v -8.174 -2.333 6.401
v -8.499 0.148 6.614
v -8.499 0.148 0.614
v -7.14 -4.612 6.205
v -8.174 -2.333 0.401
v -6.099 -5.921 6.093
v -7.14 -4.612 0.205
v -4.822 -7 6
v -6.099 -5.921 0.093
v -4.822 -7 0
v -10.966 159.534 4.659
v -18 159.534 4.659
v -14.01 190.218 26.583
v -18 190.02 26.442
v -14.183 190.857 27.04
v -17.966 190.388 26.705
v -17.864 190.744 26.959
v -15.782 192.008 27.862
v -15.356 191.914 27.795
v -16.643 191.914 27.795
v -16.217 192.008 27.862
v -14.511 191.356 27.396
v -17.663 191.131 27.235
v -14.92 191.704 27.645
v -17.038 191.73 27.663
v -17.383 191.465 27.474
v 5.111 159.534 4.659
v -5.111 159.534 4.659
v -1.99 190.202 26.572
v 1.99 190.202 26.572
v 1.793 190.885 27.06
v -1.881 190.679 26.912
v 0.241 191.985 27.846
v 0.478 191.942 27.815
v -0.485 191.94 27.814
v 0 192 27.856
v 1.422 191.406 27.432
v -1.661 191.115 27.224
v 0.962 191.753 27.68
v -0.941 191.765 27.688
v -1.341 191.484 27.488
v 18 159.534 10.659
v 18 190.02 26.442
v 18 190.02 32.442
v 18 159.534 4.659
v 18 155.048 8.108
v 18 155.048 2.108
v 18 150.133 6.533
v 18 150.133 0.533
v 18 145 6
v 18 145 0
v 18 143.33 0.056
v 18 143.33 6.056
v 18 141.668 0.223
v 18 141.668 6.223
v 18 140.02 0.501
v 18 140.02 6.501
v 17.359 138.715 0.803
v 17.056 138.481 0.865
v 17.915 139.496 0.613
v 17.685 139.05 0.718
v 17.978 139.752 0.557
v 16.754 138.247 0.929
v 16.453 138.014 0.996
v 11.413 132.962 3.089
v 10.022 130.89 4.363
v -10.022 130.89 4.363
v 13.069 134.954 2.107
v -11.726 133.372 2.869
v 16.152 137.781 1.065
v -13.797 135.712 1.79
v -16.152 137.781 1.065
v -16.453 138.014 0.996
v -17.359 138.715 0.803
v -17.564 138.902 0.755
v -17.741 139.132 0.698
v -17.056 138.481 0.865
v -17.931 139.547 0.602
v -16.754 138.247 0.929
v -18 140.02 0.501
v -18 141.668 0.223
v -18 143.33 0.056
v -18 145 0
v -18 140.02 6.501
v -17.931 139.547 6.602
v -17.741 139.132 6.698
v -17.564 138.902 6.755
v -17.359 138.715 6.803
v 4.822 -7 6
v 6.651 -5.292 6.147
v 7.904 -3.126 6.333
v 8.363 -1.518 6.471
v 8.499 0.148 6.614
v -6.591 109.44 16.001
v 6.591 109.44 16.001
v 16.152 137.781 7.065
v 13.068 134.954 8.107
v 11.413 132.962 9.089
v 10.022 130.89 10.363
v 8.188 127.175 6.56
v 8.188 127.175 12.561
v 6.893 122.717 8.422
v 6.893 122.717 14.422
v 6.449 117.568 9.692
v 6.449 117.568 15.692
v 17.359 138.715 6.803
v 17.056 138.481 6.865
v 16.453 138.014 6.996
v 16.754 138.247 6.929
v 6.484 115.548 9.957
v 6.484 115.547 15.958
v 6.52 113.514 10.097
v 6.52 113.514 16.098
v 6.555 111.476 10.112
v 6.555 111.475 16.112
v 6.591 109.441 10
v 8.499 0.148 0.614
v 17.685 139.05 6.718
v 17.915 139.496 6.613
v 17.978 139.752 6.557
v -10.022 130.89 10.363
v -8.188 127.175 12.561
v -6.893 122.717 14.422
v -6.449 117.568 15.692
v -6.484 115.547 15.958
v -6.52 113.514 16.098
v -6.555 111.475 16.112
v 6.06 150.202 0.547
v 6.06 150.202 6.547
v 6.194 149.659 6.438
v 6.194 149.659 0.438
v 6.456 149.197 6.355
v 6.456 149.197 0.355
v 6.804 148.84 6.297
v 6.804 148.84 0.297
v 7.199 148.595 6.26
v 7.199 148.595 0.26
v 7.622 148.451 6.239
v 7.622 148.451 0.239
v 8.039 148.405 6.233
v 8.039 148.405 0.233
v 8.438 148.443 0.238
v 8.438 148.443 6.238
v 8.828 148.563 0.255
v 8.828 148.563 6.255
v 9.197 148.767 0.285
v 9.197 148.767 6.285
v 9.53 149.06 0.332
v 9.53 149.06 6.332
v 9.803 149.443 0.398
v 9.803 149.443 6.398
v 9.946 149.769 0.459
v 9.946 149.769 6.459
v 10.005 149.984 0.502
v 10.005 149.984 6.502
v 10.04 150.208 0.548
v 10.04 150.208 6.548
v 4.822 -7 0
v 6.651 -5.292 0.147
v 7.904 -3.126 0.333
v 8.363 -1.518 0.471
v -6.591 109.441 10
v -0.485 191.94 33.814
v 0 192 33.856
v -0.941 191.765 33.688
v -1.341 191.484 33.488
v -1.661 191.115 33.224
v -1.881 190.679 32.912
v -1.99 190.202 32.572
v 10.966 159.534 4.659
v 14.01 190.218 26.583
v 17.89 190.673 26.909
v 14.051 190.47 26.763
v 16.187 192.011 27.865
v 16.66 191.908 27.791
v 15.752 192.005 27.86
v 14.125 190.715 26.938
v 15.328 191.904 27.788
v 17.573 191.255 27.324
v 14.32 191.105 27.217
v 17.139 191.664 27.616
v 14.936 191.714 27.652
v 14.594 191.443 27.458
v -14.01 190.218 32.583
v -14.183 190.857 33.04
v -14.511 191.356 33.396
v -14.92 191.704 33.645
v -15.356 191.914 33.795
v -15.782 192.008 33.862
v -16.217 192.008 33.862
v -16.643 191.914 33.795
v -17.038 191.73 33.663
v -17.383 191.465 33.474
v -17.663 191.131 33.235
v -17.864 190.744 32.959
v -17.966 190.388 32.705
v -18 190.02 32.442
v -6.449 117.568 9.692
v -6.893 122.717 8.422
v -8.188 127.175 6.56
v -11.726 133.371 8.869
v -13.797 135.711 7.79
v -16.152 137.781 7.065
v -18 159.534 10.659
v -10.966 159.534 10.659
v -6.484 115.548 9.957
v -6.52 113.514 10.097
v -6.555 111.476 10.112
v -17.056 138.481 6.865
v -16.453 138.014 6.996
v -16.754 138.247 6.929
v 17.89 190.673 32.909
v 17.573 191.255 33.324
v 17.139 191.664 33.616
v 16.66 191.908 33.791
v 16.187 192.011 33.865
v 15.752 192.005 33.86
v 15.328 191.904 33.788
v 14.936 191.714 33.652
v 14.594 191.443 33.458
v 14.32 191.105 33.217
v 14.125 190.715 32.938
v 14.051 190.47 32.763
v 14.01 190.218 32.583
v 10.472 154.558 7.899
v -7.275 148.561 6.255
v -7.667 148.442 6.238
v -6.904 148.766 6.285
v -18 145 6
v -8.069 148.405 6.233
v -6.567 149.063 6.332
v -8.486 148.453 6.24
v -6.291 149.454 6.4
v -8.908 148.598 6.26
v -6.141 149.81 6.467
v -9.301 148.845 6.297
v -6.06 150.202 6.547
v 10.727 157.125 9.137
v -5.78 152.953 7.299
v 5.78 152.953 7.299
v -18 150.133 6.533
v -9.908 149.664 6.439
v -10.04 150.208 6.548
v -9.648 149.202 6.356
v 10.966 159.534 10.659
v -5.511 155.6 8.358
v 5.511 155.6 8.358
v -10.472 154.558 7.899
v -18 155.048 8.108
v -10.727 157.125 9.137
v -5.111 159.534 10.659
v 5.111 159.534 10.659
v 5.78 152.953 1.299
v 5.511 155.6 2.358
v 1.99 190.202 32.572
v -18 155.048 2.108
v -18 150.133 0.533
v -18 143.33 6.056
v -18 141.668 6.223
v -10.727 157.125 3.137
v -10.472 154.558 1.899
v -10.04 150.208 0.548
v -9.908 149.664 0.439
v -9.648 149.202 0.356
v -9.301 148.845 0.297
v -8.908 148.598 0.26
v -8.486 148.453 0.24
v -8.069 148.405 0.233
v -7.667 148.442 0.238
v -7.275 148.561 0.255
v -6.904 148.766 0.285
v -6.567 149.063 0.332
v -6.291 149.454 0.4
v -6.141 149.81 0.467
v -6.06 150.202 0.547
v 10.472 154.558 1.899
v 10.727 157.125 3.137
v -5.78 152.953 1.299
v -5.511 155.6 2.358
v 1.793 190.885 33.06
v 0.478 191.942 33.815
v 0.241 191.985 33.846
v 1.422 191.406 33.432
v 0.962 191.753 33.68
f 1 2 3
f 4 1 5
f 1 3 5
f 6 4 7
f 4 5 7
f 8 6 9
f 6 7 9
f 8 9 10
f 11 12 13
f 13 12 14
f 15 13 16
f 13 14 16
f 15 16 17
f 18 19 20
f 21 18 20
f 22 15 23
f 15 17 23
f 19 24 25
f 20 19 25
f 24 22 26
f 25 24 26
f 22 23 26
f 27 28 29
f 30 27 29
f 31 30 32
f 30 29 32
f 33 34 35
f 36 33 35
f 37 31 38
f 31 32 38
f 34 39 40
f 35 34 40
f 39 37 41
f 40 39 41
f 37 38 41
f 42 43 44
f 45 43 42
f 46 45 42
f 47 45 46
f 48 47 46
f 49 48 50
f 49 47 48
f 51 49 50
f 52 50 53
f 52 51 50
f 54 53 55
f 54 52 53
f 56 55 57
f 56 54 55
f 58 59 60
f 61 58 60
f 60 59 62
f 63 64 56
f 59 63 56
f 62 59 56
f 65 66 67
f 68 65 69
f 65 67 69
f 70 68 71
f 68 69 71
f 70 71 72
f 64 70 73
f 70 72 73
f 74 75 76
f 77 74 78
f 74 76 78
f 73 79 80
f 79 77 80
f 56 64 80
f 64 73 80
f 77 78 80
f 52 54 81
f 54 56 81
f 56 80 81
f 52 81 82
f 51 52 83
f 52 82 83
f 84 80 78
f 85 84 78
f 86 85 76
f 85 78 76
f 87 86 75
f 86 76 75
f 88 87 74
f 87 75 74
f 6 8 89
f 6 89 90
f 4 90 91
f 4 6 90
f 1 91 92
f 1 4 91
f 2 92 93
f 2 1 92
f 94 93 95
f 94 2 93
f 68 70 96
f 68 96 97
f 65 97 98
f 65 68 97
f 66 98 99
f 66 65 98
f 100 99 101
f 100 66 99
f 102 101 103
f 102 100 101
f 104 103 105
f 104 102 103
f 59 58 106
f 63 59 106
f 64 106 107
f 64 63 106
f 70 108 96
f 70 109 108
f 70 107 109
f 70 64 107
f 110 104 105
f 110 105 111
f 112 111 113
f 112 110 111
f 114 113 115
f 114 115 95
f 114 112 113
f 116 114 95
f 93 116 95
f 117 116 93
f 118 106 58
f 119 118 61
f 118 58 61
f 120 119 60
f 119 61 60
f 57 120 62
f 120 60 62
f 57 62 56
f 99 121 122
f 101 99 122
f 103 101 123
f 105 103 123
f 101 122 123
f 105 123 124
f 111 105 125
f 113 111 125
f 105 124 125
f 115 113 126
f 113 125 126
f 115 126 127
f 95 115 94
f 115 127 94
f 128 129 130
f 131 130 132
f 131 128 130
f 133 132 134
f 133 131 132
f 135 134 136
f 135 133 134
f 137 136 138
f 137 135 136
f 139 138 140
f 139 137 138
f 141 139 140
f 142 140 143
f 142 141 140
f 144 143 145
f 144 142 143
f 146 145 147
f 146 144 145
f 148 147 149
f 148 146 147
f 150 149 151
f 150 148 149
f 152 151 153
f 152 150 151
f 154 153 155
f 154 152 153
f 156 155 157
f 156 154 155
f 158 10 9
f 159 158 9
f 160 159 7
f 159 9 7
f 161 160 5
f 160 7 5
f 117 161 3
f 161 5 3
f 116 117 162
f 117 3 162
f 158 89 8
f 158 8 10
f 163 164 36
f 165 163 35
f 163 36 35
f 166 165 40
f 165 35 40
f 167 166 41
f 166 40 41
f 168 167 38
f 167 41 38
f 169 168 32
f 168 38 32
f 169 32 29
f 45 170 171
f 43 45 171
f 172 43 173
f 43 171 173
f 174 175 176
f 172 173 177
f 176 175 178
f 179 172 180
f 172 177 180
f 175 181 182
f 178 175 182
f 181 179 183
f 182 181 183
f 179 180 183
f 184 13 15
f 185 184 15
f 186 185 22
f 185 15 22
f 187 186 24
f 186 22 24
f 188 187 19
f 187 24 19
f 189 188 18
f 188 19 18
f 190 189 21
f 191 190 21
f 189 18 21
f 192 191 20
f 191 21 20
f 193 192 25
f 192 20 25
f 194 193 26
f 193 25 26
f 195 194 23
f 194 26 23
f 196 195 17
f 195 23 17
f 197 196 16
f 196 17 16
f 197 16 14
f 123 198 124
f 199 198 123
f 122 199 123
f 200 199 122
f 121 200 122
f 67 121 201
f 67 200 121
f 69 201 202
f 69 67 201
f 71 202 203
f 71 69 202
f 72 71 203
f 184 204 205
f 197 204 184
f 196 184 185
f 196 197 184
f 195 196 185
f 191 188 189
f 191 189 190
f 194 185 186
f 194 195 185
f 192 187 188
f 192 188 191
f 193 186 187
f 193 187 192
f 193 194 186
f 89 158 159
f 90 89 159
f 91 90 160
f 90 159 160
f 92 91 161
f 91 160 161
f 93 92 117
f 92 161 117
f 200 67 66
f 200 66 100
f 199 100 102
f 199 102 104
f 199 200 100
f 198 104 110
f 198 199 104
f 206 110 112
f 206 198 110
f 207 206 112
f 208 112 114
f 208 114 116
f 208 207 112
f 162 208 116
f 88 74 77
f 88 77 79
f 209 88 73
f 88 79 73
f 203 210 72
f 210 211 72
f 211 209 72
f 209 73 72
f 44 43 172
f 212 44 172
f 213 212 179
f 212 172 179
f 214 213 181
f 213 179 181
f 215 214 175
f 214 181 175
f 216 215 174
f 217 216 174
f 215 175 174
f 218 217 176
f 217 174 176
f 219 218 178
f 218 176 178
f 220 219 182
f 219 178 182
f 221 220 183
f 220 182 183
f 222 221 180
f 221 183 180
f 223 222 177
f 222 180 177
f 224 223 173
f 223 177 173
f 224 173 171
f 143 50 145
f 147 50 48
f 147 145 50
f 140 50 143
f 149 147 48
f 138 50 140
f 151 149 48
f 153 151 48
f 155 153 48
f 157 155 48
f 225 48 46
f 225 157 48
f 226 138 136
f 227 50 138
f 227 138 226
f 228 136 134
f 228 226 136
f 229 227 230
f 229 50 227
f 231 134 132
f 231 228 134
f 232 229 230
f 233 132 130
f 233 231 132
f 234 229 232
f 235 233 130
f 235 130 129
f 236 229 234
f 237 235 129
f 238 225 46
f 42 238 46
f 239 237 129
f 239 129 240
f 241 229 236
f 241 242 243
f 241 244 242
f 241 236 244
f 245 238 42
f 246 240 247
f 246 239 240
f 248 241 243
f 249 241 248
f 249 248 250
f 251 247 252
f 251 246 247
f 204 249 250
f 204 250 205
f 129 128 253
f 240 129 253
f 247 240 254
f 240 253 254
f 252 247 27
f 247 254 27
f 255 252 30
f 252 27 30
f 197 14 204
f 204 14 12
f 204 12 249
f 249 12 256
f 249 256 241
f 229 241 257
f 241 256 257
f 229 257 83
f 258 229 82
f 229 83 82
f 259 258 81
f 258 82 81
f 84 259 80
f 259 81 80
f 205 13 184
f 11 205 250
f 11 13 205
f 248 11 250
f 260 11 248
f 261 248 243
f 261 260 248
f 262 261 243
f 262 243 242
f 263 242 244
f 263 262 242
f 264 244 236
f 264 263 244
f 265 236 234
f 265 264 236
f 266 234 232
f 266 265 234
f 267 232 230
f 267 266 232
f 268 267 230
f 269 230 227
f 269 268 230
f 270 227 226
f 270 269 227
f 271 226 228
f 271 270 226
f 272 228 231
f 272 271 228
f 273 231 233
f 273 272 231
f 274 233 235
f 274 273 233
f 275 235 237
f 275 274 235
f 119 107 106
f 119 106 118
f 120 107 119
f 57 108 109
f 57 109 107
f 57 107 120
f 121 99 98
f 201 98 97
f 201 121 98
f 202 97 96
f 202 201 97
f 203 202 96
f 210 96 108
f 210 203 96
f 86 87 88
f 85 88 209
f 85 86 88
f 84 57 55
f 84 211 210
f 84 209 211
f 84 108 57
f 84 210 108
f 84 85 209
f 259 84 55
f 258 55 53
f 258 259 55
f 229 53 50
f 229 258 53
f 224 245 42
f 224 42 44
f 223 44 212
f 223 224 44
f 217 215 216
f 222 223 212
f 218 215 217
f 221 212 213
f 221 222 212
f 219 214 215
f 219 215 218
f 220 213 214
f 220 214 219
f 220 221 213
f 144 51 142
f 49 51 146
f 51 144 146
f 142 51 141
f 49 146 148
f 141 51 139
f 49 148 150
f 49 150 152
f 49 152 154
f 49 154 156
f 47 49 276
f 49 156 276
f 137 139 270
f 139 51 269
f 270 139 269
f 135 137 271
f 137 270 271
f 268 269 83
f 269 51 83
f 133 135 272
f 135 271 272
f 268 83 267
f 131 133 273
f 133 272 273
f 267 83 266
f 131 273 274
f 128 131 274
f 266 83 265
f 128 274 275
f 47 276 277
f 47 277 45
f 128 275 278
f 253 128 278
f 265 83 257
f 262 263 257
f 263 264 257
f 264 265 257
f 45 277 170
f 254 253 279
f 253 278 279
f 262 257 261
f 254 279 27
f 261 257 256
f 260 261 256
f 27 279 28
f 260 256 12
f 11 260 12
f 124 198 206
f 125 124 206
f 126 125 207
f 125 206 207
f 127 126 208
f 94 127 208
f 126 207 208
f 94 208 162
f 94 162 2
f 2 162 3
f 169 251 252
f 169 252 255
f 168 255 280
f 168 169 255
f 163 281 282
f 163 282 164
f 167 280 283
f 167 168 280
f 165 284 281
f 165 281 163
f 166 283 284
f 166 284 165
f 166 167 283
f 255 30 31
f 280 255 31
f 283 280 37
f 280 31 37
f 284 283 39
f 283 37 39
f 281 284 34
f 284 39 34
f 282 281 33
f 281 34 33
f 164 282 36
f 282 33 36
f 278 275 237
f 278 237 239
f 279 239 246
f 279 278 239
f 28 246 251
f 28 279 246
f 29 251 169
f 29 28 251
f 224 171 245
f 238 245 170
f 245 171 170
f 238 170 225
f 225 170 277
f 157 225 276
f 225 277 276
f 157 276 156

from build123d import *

# Parameters (mm, degrees)
PAD001_DEPTH = 50
PAD_DEPTH    = 50


with BuildPart() as forkyz:
    # Sketch → Pad001 (new body)
    with BuildSketch(Plane.YZ):
        with BuildLine():
            Line((-7, 0), (109.440979, 10))
            ThreePointArc((130.889931, 4.362511), (120.653215, 9.037037), (109.440979, 10))
            ThreePointArc((130.889931, 4.362511), (137.615463, 1.115515), (145, 0))
            ThreePointArc((145, 0), (152.631281, 1.193204), (159.534108, 4.658916))
            Line((159.534108, 4.658916), (195, 30))
            Line((195, 30), (195, 36))
            Line((159.534108, 10.658916), (195, 36))
            ThreePointArc((145, 6), (152.631281, 7.193204), (159.534108, 10.658916))
            ThreePointArc((130.889584, 10.362749), (137.615262, 7.115577), (145, 6))
            ThreePointArc((130.889584, 10.362749), (120.652594, 15.03754), (109.44, 16.000536))
            Line((-7, 6), (109.44, 16.000536))
            Line((-7, 6), (-7, 0))
        make_face()
    extrude(amount=PAD001_DEPTH)


with BuildPart() as forkyz_1:
    # Body001 placement: moved
    add(forkyz.part.moved(Location((-25, 0, 0))))


with BuildPart() as common:
    # Sketch003 → Pad (new body)
    with BuildSketch(Plane.XY):
        with BuildLine():
            Line((18, 190.020199), (18, 140.020199))
            ThreePointArc((17.359364, 138.714947), (17.831207, 139.293202), (18, 140.020199))
            Line((17.359364, 138.714947), (16.151931, 137.781227))
            ThreePointArc((16.151931, 137.781227), (8.907519, 128.823515), (6.449131, 117.568362))
            Line((6.449131, 117.568362), (8.498705, 0.148345))
            ThreePointArc((0, -8.5), (6.062629, -5.957729), (8.498705, 0.148345))
            ThreePointArc((-8.498705, 0.148345), (-6.062629, -5.957729), (0, -8.5))
            Line((-6.449131, 117.568362), (-8.498705, 0.148345))
            ThreePointArc((-6.449131, 117.568362), (-8.907519, 128.823515), (-16.151931, 137.781227))
            Line((-17.359364, 138.714947), (-16.151931, 137.781227))
            ThreePointArc((-18, 140.020199), (-17.831207, 139.293202), (-17.359364, 138.714947))
            Line((-18, 190.020199), (-18, 140.020199))
            ThreePointArc((-14.009771, 190.217657), (-16.098849, 192.017755), (-18, 190.020199))
            Line((-14.009771, 190.217657), (-10.040229, 150.207506))
            ThreePointArc((-10.040229, 150.207506), (-8.052525, 148.404965), (-6.060276, 150.202482))
            Line((-6.060276, 150.202482), (-1.989724, 190.202482))
            ThreePointArc((0, 192), (-1.340716, 191.484076), (-1.989724, 190.202482))
            ThreePointArc((1.989724, 190.202482), (1.340716, 191.484076), (0, 192))
            Line((6.060276, 150.202482), (1.989724, 190.202482))
            ThreePointArc((6.060276, 150.202482), (8.052525, 148.404965), (10.040229, 150.207506))
            Line((14.009771, 190.217657), (10.040229, 150.207506))
            ThreePointArc((18, 190.020199), (16.098849, 192.017755), (14.009771, 190.217657))
        make_face()
    extrude(amount=PAD_DEPTH)


with BuildPart() as common_1:
    # Body placement: moved
    add(common.part.moved(Location((0, 0, -8))))

    # Common: intersect forkYZ
    add(forkyz_1.part, mode=Mode.INTERSECT)


solid = common_1.part
